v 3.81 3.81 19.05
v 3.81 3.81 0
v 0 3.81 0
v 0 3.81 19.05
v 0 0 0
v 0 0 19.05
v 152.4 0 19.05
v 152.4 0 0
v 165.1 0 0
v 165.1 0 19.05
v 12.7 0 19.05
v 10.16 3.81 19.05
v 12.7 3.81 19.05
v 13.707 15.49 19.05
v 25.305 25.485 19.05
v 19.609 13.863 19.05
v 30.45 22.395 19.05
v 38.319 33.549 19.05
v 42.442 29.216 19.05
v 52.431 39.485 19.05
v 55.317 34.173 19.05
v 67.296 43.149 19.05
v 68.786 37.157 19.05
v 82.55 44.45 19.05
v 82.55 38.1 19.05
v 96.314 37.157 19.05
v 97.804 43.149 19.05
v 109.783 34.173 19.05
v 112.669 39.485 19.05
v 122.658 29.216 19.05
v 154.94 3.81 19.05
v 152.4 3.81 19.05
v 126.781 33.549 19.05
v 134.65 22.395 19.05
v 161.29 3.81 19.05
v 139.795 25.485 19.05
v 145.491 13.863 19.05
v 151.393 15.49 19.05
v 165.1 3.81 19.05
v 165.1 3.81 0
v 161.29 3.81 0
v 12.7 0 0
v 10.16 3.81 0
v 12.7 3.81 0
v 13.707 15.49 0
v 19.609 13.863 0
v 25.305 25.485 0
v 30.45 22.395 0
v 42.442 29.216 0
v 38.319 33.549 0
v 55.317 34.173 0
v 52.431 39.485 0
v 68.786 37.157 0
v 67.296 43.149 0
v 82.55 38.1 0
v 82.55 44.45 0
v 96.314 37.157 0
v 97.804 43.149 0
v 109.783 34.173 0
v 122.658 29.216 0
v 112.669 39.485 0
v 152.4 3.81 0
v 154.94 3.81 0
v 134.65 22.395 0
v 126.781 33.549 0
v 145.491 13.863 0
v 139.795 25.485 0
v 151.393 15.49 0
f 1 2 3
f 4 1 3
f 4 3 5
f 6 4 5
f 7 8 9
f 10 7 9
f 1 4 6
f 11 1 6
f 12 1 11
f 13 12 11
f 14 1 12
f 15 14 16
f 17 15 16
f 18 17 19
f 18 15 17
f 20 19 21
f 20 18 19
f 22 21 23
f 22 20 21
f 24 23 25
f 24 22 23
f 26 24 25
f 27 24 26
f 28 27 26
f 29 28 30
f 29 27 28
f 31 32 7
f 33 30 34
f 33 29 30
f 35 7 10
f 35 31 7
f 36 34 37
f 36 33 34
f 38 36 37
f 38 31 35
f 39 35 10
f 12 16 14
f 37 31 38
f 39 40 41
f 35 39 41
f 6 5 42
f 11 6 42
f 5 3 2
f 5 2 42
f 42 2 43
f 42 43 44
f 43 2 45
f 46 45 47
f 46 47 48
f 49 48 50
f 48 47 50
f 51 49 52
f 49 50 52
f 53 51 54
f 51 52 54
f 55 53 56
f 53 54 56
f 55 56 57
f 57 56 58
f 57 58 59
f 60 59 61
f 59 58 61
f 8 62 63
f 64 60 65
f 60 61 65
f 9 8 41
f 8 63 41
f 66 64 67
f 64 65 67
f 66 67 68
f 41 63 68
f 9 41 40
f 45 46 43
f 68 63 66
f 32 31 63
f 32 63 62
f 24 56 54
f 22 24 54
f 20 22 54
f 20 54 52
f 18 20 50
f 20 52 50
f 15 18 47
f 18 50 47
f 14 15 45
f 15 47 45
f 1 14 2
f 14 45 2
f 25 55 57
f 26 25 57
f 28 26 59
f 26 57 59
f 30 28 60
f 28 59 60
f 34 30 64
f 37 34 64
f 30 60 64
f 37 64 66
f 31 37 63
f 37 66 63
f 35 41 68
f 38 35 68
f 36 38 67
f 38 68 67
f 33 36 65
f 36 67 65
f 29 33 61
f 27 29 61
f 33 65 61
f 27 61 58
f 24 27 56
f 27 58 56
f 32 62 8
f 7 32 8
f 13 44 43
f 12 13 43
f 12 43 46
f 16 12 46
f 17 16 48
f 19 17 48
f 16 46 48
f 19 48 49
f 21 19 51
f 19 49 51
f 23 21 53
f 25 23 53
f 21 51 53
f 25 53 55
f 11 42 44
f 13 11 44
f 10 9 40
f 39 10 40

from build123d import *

# Parameters (mm, degrees)
BOSS_EXTRUDE1_DEPTH = 19.05


with BuildPart() as part:
    # Sketch1 → Boss-Extrude1 (new body)
    with BuildSketch(Plane.XY):
        with BuildLine():
            Line((0, 0), (12.7, 0))
            Line((12.7, 0), (12.7, 3.81))
            Line((12.7, 3.81), (10.16, 3.81))
            ThreePointArc((10.16, 3.81), (42.442039197, 29.215695028), (82.55, 38.1))
            ThreePointArc((82.55, 38.1), (122.657960803, 29.215695028), (154.94, 3.81))
            Line((154.94, 3.81), (152.4, 3.81))
            Line((152.4, 3.81), (152.4, 0))
            Line((152.4, 0), (165.1, 0))
            Line((165.1, 0), (165.1, 3.81))
            Line((165.1, 3.81), (161.29, 3.81))
            ThreePointArc((161.29, 3.81), (126.781281636, 33.54873317), (82.55, 44.45))
            ThreePointArc((82.55, 44.45), (38.318718364, 33.54873317), (3.81, 3.81))
            Line((3.81, 3.81), (0, 3.81))
            Line((0, 3.81), (0, 0))
        make_face()
    extrude(amount=BOSS_EXTRUDE1_DEPTH)


solid = part.part
